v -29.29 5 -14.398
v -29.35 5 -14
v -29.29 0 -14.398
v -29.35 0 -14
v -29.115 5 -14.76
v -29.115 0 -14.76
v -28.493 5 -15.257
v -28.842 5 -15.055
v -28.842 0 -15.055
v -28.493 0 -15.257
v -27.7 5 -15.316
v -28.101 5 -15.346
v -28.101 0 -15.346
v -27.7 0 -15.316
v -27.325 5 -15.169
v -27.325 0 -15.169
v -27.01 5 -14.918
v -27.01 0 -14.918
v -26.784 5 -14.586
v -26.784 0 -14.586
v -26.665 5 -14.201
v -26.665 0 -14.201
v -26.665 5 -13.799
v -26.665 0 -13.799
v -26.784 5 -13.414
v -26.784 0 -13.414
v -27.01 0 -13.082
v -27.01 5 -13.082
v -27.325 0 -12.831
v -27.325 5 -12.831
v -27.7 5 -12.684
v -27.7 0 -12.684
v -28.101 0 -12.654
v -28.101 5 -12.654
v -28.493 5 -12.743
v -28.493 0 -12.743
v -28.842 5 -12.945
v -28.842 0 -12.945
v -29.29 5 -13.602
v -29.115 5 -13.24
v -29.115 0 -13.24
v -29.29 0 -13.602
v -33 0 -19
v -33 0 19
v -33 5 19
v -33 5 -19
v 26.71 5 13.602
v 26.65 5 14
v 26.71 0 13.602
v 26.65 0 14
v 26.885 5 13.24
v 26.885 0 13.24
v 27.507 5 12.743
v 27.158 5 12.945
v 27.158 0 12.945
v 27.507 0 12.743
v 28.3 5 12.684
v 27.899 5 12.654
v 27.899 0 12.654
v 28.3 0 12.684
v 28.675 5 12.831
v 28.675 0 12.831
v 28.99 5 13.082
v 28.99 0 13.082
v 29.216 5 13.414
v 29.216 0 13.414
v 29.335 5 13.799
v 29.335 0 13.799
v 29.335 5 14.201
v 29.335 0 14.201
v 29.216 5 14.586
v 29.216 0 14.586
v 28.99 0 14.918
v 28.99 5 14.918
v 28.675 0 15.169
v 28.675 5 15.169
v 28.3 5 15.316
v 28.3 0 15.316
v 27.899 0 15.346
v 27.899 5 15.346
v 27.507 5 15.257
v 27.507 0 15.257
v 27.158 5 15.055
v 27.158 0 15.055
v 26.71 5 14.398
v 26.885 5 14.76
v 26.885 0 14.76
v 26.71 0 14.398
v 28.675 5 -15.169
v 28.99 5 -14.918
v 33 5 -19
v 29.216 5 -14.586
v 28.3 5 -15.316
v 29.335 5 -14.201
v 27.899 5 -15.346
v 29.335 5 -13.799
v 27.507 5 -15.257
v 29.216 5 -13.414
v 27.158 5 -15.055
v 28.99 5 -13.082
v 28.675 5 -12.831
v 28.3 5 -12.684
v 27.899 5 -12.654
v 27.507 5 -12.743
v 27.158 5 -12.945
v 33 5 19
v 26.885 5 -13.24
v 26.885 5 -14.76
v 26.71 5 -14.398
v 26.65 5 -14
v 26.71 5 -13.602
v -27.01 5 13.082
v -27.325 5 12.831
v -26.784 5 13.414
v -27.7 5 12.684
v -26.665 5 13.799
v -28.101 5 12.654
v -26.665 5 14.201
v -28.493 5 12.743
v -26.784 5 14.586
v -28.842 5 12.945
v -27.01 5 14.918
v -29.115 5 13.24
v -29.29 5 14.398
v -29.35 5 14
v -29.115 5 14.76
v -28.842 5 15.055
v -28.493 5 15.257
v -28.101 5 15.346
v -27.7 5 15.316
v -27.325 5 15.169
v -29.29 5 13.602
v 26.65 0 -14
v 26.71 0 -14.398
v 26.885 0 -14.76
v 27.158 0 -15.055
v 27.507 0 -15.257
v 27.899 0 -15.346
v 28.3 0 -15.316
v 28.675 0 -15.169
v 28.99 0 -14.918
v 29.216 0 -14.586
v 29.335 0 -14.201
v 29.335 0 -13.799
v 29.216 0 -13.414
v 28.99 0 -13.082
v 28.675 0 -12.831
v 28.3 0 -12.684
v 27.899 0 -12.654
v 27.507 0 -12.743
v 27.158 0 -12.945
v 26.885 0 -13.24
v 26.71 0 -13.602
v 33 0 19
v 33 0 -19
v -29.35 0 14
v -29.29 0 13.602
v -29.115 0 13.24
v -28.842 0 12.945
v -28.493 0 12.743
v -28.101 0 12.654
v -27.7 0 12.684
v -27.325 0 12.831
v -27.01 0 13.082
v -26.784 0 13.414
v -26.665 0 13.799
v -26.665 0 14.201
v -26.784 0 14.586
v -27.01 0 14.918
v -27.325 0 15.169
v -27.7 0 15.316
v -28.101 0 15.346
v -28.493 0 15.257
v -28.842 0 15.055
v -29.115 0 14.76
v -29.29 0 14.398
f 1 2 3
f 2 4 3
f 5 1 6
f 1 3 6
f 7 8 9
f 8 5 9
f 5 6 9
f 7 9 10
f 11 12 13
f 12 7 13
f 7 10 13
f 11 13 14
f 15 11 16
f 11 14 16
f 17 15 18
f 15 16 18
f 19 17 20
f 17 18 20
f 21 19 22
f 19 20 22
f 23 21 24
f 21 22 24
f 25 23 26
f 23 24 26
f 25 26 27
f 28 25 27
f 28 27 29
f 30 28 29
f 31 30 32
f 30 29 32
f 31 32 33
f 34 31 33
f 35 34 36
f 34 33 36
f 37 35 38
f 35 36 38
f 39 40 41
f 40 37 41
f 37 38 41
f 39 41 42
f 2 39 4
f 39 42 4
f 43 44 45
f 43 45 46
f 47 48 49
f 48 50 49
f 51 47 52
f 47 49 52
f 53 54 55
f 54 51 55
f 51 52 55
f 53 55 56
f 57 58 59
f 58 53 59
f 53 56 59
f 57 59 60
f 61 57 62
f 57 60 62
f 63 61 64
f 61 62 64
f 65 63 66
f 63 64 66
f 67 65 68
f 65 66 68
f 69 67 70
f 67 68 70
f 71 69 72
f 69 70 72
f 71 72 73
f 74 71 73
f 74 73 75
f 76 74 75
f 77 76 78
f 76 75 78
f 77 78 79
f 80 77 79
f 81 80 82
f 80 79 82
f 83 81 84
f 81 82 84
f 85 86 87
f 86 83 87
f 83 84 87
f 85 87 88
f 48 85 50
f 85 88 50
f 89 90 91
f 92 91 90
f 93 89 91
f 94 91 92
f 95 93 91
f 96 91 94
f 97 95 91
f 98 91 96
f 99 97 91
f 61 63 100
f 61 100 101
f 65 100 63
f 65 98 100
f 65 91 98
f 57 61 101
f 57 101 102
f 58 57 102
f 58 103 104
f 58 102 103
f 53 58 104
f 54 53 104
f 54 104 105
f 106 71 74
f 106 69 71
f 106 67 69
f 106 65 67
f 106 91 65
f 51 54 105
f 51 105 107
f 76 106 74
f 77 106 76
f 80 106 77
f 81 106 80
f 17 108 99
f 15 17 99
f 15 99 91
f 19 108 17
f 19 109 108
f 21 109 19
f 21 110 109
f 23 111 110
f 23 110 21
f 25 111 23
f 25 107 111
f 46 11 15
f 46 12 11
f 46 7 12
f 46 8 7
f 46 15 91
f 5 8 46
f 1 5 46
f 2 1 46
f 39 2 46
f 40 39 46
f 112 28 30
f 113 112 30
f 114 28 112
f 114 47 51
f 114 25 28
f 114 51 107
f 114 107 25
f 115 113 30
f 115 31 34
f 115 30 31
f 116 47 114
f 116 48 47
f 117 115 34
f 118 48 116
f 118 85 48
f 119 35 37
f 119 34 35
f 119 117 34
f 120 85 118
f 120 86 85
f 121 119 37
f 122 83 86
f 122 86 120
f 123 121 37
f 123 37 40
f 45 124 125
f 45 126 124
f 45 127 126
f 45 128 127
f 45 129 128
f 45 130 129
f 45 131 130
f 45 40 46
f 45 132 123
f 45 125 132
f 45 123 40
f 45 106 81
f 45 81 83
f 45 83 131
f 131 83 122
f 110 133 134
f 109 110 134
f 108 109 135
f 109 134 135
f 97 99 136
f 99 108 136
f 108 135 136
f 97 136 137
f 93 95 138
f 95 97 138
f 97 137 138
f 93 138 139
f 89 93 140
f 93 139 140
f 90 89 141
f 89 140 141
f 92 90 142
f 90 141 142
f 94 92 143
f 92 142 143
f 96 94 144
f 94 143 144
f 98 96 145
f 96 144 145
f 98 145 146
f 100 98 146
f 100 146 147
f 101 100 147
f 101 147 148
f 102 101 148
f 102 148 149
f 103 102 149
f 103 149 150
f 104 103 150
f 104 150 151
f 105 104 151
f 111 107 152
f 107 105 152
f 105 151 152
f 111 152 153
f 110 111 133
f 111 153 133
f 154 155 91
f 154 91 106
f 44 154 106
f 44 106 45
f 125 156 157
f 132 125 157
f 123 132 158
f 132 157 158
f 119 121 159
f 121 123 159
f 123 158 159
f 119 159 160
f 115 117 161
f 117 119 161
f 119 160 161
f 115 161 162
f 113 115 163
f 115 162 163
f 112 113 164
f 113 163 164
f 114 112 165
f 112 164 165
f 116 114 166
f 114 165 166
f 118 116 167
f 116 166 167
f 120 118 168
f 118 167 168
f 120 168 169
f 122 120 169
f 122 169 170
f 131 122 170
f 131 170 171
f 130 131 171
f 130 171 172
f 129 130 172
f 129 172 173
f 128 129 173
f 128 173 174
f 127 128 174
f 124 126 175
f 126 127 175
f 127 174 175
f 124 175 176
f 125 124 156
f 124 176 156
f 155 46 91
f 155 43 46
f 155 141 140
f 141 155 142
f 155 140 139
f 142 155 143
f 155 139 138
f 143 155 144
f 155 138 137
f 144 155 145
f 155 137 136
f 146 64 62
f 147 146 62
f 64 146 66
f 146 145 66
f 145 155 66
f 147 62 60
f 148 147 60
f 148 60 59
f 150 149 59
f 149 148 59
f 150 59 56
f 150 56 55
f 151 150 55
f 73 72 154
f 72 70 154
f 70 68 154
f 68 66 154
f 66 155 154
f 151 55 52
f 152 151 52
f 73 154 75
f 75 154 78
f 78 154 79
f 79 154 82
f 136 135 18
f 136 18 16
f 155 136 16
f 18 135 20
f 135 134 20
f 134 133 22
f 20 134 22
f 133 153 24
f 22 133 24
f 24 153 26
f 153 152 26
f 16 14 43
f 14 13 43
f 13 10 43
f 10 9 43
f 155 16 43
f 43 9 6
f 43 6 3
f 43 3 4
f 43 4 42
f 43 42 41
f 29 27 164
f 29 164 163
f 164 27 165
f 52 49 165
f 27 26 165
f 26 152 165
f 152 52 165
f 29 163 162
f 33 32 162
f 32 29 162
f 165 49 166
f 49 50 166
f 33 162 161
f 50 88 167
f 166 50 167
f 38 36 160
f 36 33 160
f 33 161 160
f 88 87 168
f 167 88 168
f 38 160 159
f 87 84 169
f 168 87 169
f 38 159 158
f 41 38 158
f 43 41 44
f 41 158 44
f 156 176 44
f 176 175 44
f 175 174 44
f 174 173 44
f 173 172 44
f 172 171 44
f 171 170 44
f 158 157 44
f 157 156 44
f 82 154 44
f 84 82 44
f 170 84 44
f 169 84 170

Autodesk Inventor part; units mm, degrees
ref_plane "YZ Plane" through (0, 0, 0) normal (1, 0, 0) x (0, 1, 0)
ref_plane "XZ Plane" through (0, 0, 0) normal (0, 1, 0) x (-1, 0, 0)
ref_plane "XY Plane" through (0, 0, 0) normal (0, 0, 1) x (1, 0, 0)
sketch "Эскиз1" plane through (0, 0, 0) normal (0, 1, 0) x (-1, 0, 0)
  line L0 (33, -19) -> (-33, -19)
  line L1 (-33, -19) -> (-33, 19)
  line L2 (-33, 19) -> (33, 19)
  line L3 (33, 19) -> (33, -19)
  line L4 (0, -26.6) -> (0, 26.6) projected
  line L5 (46.2, 0) -> (-46.2, 0) projected
  circle A0 centre (28, -14) radius 1.35
  circle A1 centre (28, 14) radius 1.35
  circle A2 centre (-28, -14) radius 1.35
  circle A3 centre (-28, 14) radius 1.35
  point P0 (0, 0)
  dimension "d0" = 66
  dimension "d1" = 38
  dimension "d11" = 2.7
  dimension "d12" = 5
  dimension "d13" = 5
extrude "Выдавливание1" add sketch "Эскиз1" along normal blind 5
properties part number "драйвер двигателя"
